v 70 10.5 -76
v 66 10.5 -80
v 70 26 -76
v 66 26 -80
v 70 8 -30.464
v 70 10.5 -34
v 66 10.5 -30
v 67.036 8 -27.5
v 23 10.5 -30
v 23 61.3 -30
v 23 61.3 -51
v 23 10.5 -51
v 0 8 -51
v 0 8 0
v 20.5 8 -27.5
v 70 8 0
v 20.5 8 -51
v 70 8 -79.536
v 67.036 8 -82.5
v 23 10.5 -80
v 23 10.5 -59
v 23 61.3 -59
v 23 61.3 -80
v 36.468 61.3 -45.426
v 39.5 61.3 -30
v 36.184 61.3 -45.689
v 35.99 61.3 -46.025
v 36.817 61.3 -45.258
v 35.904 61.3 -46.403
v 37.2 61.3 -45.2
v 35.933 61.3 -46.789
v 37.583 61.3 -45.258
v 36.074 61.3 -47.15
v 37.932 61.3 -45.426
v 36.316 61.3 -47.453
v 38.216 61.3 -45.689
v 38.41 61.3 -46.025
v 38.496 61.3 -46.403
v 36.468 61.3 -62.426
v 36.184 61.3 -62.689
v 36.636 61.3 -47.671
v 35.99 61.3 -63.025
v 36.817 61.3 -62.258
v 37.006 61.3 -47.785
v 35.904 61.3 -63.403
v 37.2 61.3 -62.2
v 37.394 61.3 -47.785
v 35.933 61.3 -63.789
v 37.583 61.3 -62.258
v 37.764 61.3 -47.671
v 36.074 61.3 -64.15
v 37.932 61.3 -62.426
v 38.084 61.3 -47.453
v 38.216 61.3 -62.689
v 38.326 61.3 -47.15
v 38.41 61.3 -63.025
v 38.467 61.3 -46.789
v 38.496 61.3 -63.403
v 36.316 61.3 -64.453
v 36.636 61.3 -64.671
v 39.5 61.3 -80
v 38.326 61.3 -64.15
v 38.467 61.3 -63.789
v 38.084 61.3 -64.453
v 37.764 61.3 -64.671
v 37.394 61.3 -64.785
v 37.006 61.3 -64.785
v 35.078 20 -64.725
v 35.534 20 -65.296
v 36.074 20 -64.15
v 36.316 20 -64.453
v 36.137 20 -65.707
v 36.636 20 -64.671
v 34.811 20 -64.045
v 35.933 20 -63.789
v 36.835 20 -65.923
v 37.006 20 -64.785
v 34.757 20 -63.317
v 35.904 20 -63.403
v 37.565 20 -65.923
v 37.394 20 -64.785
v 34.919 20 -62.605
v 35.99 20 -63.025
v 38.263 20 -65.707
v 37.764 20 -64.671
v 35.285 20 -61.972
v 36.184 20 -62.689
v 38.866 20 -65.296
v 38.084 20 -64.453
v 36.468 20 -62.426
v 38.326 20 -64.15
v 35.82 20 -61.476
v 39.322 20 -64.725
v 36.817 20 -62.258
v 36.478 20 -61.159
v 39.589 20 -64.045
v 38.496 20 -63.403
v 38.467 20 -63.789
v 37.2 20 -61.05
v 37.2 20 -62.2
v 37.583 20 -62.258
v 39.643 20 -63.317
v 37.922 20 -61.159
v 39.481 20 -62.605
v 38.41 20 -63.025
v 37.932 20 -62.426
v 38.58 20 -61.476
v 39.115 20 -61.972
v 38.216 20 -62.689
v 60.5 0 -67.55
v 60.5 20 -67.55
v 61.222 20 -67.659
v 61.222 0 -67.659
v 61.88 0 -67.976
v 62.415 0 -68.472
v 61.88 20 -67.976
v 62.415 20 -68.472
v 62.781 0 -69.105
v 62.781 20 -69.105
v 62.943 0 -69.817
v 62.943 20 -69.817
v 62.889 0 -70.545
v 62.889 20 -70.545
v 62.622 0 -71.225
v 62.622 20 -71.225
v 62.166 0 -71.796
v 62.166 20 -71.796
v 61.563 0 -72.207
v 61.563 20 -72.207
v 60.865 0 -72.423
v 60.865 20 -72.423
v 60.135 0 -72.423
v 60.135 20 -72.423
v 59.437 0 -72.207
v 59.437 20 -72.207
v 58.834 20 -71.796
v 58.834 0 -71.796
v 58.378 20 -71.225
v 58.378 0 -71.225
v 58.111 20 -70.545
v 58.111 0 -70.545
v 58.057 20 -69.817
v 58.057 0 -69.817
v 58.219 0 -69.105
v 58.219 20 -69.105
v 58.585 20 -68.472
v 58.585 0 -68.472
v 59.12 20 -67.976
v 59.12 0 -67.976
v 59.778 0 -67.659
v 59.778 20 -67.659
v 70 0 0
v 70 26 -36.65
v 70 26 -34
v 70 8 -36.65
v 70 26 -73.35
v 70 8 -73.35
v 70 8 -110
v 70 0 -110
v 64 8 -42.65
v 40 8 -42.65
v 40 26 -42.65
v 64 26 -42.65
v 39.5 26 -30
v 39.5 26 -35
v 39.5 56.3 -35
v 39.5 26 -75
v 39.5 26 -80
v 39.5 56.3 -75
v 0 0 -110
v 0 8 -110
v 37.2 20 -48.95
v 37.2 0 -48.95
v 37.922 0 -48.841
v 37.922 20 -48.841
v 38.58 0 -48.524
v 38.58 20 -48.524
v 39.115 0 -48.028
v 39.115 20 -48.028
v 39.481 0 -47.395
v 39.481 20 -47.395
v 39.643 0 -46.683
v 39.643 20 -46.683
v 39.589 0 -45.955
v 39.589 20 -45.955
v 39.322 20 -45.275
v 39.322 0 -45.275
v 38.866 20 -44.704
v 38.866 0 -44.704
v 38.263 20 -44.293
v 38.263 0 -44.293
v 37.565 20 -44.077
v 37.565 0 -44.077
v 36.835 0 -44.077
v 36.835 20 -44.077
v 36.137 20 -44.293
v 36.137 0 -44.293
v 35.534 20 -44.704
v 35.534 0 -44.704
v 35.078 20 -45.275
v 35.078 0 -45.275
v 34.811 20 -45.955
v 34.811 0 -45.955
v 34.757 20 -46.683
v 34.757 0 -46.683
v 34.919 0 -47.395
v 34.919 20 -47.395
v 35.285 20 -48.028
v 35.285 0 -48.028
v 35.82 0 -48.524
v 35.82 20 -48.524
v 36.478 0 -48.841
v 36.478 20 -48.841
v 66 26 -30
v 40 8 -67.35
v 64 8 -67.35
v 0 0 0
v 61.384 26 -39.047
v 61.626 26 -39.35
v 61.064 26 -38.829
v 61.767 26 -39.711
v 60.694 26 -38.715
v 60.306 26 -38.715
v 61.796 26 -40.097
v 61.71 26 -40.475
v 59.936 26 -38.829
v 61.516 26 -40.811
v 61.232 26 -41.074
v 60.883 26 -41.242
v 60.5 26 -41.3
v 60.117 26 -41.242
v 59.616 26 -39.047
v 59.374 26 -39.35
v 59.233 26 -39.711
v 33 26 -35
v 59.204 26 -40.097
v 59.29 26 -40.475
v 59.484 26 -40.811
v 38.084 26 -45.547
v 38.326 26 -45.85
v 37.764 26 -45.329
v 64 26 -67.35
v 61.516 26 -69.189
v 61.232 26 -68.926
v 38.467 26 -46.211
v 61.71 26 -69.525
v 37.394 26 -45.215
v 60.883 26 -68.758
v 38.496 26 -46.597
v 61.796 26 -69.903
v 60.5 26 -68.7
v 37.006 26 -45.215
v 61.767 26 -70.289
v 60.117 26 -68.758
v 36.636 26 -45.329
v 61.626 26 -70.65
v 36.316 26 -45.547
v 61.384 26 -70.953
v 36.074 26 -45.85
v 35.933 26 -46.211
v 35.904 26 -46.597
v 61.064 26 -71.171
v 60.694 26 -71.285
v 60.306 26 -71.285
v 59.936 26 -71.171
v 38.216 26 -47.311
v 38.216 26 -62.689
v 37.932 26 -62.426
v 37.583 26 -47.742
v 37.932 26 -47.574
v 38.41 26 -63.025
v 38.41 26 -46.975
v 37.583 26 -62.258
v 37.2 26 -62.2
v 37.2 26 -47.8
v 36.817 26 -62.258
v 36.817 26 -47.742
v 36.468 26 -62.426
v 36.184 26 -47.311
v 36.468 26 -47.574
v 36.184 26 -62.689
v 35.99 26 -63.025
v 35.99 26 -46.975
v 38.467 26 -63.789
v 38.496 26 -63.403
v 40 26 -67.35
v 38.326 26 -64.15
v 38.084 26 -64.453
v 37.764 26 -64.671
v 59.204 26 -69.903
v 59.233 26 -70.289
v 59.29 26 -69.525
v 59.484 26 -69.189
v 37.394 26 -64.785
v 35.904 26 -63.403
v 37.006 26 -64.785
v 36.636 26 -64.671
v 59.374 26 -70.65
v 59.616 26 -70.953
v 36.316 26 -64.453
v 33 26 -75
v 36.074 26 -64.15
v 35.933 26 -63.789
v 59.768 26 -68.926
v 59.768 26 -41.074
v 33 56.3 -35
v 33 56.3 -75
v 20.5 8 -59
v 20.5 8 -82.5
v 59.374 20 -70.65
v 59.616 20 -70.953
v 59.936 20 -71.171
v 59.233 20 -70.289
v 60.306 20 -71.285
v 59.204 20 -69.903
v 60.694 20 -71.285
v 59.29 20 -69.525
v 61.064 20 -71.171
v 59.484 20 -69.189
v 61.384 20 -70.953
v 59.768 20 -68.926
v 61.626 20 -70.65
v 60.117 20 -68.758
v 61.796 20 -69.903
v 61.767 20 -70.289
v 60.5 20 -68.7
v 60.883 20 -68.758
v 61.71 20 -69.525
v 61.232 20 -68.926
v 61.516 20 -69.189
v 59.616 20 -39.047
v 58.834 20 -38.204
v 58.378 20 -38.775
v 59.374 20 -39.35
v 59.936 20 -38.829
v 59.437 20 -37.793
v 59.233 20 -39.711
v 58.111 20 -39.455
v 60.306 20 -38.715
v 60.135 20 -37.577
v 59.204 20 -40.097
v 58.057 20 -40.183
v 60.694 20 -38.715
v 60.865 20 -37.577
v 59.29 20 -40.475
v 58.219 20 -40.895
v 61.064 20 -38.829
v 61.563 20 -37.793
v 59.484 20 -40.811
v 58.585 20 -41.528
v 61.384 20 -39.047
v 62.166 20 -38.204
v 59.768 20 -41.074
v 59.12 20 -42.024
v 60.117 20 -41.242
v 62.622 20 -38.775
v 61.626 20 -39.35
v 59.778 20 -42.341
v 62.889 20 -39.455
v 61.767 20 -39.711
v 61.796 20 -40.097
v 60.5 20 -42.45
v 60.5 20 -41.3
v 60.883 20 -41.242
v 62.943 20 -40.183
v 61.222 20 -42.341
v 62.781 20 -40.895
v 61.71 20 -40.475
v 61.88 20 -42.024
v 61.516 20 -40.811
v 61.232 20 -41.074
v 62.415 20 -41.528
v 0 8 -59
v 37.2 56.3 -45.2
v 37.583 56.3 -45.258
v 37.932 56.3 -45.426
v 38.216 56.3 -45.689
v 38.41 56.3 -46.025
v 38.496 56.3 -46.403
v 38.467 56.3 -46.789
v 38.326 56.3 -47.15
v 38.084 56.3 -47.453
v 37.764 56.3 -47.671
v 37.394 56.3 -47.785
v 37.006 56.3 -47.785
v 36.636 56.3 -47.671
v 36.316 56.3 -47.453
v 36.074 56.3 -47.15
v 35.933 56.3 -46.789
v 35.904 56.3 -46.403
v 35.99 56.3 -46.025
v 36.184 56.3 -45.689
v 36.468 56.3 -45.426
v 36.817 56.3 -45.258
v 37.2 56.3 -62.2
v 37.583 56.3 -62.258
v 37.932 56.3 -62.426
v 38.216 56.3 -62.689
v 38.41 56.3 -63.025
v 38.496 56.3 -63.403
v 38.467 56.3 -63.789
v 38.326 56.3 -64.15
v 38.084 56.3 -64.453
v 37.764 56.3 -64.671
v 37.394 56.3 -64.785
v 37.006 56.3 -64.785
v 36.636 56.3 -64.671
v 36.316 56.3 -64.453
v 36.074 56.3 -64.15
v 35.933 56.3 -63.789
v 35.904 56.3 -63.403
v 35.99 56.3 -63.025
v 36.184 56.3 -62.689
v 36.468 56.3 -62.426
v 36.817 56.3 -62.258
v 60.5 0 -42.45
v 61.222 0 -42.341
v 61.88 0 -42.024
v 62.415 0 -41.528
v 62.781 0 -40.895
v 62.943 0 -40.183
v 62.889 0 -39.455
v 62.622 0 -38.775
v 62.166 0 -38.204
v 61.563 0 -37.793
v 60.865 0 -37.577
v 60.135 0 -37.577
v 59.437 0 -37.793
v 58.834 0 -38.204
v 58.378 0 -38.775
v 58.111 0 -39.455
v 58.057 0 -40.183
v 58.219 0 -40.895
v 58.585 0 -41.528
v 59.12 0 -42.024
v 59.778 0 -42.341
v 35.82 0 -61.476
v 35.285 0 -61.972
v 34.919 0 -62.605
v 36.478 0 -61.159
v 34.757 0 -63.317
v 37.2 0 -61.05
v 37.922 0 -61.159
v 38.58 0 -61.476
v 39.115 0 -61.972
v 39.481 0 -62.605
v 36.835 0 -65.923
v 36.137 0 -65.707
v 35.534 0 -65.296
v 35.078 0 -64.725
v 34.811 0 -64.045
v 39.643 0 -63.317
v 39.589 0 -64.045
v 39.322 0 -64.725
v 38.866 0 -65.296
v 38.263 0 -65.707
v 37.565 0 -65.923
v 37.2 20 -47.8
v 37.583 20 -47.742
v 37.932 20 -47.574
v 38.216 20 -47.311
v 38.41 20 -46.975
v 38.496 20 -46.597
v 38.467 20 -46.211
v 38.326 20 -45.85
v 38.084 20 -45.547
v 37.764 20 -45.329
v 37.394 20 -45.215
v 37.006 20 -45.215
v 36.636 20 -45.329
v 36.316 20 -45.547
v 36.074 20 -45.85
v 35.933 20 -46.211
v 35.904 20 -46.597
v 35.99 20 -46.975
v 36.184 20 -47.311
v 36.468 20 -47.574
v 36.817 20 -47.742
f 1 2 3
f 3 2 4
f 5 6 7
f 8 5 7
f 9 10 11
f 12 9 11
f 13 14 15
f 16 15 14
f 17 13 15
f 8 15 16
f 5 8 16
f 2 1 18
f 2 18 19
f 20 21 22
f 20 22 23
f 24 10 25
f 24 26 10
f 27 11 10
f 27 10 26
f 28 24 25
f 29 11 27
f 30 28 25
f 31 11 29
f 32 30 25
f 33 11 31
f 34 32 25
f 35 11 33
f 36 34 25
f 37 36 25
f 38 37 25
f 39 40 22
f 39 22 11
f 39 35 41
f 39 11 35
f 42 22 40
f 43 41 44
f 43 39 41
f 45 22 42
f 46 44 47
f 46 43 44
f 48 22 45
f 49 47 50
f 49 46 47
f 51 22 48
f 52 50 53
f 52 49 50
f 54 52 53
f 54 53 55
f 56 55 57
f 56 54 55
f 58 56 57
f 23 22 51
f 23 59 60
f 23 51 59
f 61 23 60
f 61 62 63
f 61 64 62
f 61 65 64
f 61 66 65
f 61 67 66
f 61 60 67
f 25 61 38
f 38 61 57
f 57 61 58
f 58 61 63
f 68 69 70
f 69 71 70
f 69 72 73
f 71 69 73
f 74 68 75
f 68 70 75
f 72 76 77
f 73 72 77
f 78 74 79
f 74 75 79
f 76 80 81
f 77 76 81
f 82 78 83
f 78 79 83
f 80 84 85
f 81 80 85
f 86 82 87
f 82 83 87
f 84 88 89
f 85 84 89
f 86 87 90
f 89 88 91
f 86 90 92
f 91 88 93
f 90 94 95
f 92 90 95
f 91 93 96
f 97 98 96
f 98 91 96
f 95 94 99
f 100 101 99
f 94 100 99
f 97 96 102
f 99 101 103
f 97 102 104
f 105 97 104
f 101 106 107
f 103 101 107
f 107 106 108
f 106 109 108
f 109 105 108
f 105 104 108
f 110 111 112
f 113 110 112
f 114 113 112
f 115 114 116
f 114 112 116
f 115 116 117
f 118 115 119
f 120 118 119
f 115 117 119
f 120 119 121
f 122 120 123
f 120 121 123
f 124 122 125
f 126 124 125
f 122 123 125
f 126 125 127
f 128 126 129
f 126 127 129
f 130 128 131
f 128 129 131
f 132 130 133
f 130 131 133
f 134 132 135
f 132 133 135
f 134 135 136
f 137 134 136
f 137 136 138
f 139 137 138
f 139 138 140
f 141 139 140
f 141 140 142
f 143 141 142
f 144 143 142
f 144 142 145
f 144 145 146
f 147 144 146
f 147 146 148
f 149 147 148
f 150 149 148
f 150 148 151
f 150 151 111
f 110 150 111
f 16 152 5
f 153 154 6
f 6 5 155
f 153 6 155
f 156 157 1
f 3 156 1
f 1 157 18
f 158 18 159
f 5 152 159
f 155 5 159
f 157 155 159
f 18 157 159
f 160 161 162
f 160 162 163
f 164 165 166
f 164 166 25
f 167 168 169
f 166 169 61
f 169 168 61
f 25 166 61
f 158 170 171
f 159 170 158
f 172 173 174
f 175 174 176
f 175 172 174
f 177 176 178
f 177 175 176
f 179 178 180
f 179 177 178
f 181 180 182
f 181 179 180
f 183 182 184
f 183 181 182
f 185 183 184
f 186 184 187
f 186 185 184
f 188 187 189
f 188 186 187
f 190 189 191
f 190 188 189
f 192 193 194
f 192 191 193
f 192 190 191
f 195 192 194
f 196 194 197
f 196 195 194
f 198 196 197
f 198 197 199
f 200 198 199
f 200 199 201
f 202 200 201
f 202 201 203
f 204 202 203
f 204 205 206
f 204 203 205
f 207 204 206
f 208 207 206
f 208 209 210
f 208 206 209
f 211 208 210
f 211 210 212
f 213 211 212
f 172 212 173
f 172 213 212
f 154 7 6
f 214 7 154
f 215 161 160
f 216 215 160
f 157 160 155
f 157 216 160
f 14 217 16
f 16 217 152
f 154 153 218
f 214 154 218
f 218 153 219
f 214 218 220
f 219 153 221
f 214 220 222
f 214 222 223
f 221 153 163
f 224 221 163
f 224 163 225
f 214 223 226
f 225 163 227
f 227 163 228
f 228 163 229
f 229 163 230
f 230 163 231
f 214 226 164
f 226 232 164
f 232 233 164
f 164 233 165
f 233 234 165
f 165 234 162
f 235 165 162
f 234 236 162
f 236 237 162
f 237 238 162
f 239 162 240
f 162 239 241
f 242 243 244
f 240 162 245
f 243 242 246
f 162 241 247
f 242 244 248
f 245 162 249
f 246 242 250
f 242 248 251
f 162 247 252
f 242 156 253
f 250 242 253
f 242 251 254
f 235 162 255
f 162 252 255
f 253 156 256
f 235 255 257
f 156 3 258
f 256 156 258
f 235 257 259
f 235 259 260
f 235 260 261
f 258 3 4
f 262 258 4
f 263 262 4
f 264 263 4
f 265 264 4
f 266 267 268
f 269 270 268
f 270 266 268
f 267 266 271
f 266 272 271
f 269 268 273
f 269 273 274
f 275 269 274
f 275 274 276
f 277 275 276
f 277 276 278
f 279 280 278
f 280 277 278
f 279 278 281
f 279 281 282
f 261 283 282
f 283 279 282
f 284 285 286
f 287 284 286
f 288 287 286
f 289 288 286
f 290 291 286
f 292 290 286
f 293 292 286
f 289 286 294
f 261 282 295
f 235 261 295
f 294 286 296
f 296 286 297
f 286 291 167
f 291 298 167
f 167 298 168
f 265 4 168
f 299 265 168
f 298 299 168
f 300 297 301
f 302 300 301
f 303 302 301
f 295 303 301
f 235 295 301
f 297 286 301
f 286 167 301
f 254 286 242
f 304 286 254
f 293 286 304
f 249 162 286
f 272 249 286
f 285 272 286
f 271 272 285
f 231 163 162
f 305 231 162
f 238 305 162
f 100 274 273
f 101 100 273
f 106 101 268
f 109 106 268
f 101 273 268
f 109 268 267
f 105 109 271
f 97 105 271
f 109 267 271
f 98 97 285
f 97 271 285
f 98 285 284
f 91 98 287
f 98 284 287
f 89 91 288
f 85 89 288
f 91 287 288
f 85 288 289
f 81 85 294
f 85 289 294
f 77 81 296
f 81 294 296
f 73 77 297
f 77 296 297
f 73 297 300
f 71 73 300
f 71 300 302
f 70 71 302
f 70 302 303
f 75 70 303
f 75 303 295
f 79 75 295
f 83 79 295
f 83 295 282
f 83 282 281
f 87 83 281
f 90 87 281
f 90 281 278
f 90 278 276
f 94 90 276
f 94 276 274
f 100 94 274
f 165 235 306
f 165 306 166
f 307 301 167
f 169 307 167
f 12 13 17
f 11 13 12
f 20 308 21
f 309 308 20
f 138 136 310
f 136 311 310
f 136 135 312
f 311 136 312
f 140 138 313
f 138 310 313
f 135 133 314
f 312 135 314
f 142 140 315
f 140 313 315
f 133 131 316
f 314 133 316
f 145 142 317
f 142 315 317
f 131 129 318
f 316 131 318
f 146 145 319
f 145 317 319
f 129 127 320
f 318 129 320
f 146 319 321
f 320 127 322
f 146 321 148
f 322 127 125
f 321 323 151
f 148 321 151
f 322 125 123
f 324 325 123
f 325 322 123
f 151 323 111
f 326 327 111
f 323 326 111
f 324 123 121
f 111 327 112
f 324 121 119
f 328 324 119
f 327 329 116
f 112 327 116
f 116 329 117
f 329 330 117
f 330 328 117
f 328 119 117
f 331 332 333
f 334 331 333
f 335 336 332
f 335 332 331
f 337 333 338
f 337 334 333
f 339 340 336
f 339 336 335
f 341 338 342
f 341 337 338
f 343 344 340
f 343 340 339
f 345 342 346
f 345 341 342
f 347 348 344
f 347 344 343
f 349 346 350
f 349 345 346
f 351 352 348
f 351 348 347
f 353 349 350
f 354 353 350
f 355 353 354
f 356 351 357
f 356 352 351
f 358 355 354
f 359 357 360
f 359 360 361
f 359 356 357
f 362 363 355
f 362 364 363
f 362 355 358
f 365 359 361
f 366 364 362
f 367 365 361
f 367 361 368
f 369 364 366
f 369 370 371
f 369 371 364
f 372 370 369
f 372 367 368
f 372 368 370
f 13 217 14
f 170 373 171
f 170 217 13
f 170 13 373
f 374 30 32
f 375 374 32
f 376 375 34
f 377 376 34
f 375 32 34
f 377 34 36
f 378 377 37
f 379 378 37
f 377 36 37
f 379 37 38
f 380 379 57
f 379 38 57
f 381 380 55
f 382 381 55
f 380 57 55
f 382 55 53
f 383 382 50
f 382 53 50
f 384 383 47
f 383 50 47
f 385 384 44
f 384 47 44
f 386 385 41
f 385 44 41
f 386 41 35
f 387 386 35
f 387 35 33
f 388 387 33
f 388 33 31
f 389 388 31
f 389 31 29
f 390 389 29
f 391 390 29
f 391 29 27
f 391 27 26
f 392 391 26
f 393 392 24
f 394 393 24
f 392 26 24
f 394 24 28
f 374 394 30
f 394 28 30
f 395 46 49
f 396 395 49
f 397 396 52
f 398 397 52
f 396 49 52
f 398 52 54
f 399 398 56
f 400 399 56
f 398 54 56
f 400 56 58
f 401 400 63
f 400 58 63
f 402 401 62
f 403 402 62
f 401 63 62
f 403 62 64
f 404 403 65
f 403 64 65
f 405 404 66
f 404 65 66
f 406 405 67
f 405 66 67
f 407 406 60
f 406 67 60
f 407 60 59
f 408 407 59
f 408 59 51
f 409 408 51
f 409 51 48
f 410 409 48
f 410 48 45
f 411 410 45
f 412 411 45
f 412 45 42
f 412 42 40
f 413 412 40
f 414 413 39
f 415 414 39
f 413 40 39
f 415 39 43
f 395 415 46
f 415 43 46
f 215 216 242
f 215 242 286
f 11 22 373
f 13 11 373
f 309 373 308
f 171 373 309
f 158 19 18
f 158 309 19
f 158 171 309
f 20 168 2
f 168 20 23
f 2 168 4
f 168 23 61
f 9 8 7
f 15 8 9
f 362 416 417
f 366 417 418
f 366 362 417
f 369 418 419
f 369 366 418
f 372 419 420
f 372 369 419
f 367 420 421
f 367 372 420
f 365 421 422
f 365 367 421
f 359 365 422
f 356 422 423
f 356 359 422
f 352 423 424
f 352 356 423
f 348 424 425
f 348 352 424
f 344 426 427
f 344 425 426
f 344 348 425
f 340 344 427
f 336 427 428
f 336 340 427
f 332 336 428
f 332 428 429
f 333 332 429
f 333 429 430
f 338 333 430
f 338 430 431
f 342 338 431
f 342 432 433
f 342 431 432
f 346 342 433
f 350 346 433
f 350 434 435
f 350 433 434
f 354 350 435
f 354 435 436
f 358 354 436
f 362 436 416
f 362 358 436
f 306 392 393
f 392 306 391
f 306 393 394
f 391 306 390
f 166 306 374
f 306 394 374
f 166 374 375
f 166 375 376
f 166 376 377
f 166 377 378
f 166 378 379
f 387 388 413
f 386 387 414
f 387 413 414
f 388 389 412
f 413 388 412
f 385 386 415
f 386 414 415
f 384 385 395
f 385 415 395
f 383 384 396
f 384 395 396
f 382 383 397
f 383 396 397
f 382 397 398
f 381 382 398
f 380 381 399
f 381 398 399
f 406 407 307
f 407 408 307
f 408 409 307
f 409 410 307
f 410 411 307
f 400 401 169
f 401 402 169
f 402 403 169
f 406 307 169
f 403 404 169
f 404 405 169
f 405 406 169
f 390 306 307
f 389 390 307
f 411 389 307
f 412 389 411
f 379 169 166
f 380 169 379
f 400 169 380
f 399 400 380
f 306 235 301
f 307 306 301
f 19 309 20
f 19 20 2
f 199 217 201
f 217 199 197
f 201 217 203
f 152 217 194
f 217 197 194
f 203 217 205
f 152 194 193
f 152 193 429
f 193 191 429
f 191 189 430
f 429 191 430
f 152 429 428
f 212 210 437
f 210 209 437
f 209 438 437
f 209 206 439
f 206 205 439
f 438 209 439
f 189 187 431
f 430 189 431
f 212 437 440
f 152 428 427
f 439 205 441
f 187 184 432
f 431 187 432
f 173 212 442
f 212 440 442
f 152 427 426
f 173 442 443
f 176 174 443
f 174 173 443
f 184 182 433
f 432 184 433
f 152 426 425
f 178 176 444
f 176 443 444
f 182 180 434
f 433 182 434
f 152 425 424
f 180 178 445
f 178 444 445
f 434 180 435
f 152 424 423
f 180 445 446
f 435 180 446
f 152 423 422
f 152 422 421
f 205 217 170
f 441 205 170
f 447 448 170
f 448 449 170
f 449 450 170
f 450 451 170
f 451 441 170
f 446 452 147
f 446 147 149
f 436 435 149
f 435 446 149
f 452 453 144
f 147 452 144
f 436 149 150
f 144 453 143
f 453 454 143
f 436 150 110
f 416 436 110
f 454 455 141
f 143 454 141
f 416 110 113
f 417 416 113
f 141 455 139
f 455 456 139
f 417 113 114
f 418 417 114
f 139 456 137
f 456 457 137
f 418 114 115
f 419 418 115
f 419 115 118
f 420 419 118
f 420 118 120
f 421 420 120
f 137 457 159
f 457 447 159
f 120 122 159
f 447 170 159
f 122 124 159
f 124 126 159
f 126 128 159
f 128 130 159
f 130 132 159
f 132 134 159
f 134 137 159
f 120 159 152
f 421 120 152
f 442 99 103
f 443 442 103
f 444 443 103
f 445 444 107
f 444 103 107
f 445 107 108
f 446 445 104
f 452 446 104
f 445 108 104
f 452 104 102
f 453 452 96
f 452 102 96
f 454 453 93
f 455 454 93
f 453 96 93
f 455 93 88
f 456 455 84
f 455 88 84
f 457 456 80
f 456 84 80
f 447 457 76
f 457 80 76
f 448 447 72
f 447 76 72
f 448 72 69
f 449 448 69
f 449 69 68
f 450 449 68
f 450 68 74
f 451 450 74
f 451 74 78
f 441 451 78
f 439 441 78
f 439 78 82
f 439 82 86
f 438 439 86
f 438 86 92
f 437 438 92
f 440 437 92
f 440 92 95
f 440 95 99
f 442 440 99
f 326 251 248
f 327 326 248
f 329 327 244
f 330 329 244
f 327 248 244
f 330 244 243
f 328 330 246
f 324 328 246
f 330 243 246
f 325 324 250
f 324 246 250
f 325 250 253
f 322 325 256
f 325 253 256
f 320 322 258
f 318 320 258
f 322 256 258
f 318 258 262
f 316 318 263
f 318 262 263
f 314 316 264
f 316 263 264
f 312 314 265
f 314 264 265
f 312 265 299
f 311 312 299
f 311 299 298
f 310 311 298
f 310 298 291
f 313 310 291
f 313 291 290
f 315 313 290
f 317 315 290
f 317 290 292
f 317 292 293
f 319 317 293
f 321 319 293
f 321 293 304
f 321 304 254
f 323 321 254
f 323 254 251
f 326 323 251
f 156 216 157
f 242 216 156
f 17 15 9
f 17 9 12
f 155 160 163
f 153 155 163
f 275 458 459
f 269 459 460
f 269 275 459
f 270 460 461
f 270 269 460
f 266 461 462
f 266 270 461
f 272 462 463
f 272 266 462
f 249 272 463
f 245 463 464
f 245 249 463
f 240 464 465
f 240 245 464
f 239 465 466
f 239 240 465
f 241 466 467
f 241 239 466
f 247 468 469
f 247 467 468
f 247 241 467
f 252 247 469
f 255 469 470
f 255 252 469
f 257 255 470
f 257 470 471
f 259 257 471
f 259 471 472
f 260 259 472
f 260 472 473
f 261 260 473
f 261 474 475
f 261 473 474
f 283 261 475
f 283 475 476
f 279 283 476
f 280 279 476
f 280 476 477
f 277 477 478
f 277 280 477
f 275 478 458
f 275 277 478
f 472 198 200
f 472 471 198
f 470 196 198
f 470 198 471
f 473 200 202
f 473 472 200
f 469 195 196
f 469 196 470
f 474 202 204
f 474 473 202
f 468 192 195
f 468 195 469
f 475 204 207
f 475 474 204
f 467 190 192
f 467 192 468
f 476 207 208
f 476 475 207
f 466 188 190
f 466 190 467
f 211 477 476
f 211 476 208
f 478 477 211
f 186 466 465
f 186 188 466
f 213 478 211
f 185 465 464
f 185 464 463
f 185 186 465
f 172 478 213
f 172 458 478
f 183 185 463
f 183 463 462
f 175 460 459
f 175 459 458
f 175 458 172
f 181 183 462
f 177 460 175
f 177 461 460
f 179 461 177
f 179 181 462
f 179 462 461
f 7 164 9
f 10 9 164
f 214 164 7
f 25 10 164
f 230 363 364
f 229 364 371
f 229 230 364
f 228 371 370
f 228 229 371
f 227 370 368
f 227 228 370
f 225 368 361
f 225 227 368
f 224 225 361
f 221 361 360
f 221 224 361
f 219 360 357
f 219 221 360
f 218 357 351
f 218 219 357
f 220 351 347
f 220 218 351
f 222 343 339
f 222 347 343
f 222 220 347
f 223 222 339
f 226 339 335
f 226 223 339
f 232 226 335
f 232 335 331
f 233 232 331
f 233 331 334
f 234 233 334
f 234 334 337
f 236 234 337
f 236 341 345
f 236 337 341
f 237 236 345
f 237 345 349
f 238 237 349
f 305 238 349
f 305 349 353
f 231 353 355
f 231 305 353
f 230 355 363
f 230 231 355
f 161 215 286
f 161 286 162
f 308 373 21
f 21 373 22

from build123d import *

# Parameters (mm, degrees)
SKETCH1_W                = 70
SKETCH1_H                = 110
BOSS_EXTRUDE1_DEPTH      = 8
BOSS_EXTRUDE2_DEPTH      = 18
SKETCH3_R                = 1.3
CUT_EXTRUDE1_DEPTH       = 133.951118837
CUT_EXTRUDE3_START       = -6
SKETCH4_R                = 2.45
CUT_EXTRUDE3_DEPTH       = 127.951118837
CHAMFER2_SIZE            = 6
CHAMFER7_SIZE            = 4
CHAMFER6_SIZE            = 2.5
SKETCH6_W                = 10
SKETCH6_H                = 50
BOSS_EXTRUDE4_DEPTH      = 30.3
BOSS_EXTRUDE5_START      = 5
SKETCH7_W                = 16.5
SKETCH7_H                = 50
SKETCH7_R                = 1.3
BOSS_EXTRUDE5_DEPTH      = 5
SKETCH8_W                = 6.5
SKETCH8_H                = 30.3
BOSS_EXTRUDE6_DEPTH      = 5
BOSS_EXTRUDE7_DEPTH      = 4
BOSS_EXTRUDE7_DEPTH_BACK = 4


with BuildPart() as part:
    # Sketch1 → Boss-Extrude1 (new body)
    with BuildSketch(Plane(origin=(0, 0, 0), x_dir=(1, 0, 0), z_dir=(0, 1, 0))):
        with Locations((35, 55)):
            Rectangle(SKETCH1_W, SKETCH1_H)
    extrude(amount=BOSS_EXTRUDE1_DEPTH)

    # Sketch2 → Boss-Extrude2 (add)
    with BuildSketch(Plane(origin=(0, 8, 0), x_dir=(1, 0, 0), z_dir=(0, 1, 0))):
        Polygon((70, 67.35), (40, 67.35), (40, 42.65), (70, 42.65), (70, 30), (23, 30), (23, 80), (70, 80), align=None)
    extrude(amount=BOSS_EXTRUDE2_DEPTH)

    # Sketch3 → Cut-Extrude1 (cut, through all)
    with BuildSketch(Plane(origin=(0, 26, 0), x_dir=(1, 0, 0), z_dir=(0, 1, 0))):
        with Locations(Location((60.5, 70, 0), (0, 0, 270))):
            Circle(SKETCH3_R)
        with Locations(Location((37.2, 63.5, 0), (0, 0, 270))):
            Circle(SKETCH3_R)
    cut_extrude1 = extrude(amount=-CUT_EXTRUDE1_DEPTH, mode=Mode.SUBTRACT)

    # Sketch4 → Cut-Extrude3 (cut, through all)
    with BuildSketch(Plane(origin=(0, 26, 0), x_dir=(1, 0, 0), z_dir=(0, 1, 0)).offset(CUT_EXTRUDE3_START)):
        with Locations(Location((37.2, 63.5, 0), (0, 0, 270))):
            Circle(SKETCH4_R)
        with Locations(Location((60.5, 70, 0), (0, 0, 270))):
            Circle(SKETCH4_R)
    cut_extrude3 = extrude(amount=-CUT_EXTRUDE3_DEPTH, mode=Mode.SUBTRACT)

    # Mirror3: Cut-Extrude1, Cut-Extrude3 across plane
    add(cut_extrude1.mirror(Plane.XY.offset(-55)), mode=Mode.SUBTRACT)
    add(cut_extrude3.mirror(Plane.XY.offset(-55)), mode=Mode.SUBTRACT)

    # Chamfer2
    chamfer2_edges = [part.edges().sort_by_distance(p)[0] for p in [
        (70, 17, -67.35),
        (70, 17, -42.65),
    ]]
    chamfer(chamfer2_edges, length=CHAMFER2_SIZE)

    # Chamfer7
    chamfer7_edges = [part.edges().sort_by_distance(p)[0] for p in [
        (70, 17, -80),
        (70, 17, -30),
    ]]
    chamfer(chamfer7_edges, length=CHAMFER7_SIZE)

    # Chamfer6
    chamfer6_edges = [part.edges().sort_by_distance(p)[0] for p in [
        (44.5, 8, -80),
        (68, 8, -78),
        (68, 8, -32),
        (23, 8, -55),
        (44.5, 8, -30),
    ]]
    chamfer(chamfer6_edges, length=CHAMFER6_SIZE)

    # Sketch6 → Boss-Extrude4 (add)
    with BuildSketch(Plane(origin=(0, 26, 0), x_dir=(1, 0, 0), z_dir=(0, 1, 0))):
        with Locations((28, 55)):
            Rectangle(SKETCH6_W, SKETCH6_H)
    extrude(amount=BOSS_EXTRUDE4_DEPTH)

    # Sketch7 → Boss-Extrude5 (add)
    with BuildSketch(Plane(origin=(0, 56.3, 0), x_dir=(1, 0, 0), z_dir=(0, 1, 0)).offset(BOSS_EXTRUDE5_START)):
        with Locations((31.25, 55)):
            Rectangle(SKETCH7_W, SKETCH7_H)
        with Locations(Location((37.2, 63.5, 0), (0, 0, 270))):
            Circle(SKETCH7_R, mode=Mode.SUBTRACT)
        with Locations(Location((37.2, 46.5, 0), (0, 0, 270))):
            Circle(SKETCH7_R, mode=Mode.SUBTRACT)
    extrude(amount=-BOSS_EXTRUDE5_DEPTH)

    # Sketch8 → Boss-Extrude6 (add)
    with BuildSketch(Plane.XY.offset(-30)):
        with Locations((36.25, 41.15)):
            Rectangle(SKETCH8_W, SKETCH8_H)
    boss_extrude6 = extrude(amount=-BOSS_EXTRUDE6_DEPTH)

    # Mirror4: Boss-Extrude6 across plane
    add(boss_extrude6.mirror(Plane.XY.offset(-55)))

    # Sketch9 → Boss-Extrude7 (add, two sides: drawn at the far end of the back side and taken through both)
    with BuildSketch(Plane.XY.offset(-55).offset(-BOSS_EXTRUDE7_DEPTH_BACK)):
        Polygon((0, 8), (23, 8), (23, 61.3), align=None)
    extrude(amount=BOSS_EXTRUDE7_DEPTH + BOSS_EXTRUDE7_DEPTH_BACK)


solid = part.part
